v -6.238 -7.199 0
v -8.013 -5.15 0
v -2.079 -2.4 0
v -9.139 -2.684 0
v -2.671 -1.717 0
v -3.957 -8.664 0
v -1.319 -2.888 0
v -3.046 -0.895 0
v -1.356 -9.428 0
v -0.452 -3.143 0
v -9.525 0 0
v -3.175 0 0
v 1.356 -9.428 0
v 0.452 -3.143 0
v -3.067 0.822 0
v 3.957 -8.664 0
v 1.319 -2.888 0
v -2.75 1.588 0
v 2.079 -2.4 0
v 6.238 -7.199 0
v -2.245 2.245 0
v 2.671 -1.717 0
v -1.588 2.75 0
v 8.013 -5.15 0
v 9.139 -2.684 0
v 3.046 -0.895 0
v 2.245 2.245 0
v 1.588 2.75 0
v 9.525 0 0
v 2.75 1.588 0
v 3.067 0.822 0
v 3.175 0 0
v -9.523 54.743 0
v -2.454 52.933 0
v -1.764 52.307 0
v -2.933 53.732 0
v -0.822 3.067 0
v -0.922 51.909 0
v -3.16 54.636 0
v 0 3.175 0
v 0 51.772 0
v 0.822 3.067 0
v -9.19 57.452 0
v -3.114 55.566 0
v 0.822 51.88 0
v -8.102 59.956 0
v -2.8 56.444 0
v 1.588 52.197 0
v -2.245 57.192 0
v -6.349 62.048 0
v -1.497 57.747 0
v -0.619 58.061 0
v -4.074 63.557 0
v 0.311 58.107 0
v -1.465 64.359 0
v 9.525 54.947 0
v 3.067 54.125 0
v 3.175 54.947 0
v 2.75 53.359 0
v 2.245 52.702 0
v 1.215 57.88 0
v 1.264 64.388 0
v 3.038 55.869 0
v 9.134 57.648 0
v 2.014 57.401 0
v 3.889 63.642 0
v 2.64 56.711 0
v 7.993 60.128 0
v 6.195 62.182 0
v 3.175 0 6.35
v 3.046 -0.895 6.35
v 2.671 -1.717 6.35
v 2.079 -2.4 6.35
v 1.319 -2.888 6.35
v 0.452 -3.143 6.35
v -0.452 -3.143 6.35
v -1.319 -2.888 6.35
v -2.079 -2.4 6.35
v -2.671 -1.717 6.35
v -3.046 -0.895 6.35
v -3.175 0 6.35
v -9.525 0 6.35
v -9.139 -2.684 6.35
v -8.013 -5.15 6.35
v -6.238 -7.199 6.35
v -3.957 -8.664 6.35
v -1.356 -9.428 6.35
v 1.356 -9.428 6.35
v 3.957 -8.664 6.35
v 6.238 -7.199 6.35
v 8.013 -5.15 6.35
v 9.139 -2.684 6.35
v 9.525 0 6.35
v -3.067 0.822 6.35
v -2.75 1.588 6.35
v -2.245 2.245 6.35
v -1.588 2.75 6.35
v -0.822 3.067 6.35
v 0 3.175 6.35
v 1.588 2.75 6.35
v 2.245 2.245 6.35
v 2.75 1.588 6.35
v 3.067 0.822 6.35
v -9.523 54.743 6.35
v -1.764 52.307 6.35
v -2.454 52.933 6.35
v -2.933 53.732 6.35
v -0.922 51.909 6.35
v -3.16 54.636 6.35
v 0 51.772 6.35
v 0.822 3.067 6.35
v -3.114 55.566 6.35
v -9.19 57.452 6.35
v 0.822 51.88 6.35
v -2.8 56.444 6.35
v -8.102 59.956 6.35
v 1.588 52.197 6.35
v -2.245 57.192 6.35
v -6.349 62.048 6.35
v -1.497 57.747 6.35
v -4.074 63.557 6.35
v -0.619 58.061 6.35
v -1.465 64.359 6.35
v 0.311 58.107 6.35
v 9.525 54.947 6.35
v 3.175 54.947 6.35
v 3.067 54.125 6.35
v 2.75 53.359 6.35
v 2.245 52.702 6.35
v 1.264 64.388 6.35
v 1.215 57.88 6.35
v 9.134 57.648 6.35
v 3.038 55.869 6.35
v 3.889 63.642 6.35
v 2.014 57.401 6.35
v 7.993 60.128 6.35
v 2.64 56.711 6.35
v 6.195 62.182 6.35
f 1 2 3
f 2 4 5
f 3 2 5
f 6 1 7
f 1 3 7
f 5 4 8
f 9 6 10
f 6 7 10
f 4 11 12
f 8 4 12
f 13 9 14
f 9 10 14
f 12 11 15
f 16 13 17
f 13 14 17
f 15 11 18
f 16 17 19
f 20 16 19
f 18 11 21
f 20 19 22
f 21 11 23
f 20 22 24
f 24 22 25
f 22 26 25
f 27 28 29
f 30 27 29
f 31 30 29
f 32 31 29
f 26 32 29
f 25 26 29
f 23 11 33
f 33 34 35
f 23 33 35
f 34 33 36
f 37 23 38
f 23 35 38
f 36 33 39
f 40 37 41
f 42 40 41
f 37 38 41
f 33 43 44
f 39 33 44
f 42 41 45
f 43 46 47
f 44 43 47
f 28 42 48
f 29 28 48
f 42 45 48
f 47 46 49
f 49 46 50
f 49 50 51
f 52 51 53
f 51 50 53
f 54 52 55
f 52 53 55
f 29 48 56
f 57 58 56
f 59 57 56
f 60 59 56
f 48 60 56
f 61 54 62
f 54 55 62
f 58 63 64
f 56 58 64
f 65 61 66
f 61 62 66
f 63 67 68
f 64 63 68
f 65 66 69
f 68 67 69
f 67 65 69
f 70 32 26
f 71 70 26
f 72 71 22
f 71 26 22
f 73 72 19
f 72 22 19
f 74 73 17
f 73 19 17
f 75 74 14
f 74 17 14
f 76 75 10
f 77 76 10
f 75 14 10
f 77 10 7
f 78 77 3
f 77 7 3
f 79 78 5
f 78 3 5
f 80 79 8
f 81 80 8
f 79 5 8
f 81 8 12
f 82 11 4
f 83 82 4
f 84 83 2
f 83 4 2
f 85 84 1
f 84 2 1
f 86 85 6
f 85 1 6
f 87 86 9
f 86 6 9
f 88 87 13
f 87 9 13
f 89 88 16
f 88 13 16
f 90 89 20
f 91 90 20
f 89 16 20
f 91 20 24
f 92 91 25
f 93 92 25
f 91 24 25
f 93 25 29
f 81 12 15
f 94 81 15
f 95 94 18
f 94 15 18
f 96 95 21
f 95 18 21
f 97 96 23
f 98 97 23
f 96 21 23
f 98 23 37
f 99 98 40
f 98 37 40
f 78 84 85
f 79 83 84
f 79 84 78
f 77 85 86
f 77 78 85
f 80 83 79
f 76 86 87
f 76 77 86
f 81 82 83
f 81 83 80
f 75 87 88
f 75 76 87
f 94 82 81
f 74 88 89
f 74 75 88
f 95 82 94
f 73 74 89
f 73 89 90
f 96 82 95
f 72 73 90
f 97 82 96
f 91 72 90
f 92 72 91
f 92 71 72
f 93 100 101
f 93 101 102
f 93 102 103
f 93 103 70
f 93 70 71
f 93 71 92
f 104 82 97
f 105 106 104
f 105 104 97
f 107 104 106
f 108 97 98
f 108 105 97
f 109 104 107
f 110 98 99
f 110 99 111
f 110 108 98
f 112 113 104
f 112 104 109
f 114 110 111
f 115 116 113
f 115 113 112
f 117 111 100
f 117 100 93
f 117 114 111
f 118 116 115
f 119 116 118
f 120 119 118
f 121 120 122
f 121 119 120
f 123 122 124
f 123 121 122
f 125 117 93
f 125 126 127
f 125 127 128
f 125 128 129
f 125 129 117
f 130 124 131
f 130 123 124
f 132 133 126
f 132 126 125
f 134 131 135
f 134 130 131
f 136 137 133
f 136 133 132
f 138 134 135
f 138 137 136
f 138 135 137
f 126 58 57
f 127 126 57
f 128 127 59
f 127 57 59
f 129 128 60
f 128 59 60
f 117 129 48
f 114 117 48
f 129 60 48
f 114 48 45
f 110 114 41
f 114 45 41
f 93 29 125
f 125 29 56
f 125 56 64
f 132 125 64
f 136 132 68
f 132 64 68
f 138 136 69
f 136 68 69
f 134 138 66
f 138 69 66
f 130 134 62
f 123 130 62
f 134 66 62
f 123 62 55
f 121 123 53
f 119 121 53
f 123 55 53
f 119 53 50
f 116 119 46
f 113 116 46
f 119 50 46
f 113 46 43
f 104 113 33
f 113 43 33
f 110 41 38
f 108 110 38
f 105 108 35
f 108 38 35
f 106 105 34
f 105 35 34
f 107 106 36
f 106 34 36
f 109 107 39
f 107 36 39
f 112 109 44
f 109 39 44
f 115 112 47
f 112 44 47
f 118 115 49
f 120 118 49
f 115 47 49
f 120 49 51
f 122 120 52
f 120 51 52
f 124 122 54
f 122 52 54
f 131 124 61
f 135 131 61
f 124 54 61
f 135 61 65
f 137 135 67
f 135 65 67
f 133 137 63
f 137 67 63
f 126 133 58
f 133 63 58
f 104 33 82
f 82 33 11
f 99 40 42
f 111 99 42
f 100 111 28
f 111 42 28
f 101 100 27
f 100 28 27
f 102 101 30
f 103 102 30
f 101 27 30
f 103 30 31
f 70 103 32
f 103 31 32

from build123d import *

# Parameters (mm, degrees)
F1_DEPTH = 6.35


with BuildPart() as f1:
    # F0 (on Top) → F1 (new body)
    with BuildSketch(Plane.XY):
        with BuildLine():
            ThreePointArc((-3.175, 0), (-2.2450640303, 2.2450640303), (0, 3.175))
            Line((0, 3.175), (0, 9.525))
            ThreePointArc((0, 9.525), (-6.7351920908, 6.7351920908), (-9.525, 0))
            Line((-9.5250000075, 0), (-3.175, 0))
        make_face()
        with BuildLine():
            Line((0, 9.525), (0, 3.175))
            ThreePointArc((0, 3.175), (2.2450640303, 2.2450640303), (3.175, 0))
            Line((3.175, 0), (9.525, 0))
            ThreePointArc((9.525, 0), (6.7351920908, 6.7351920908), (0, 9.525))
        make_face()
        with BuildLine():
            Line((9.525, 0), (3.175, 0))
            ThreePointArc((3.175, 0), (0, -3.175), (-3.175, 0))
            Line((-3.175, 0), (-9.5250000075, 0))
            ThreePointArc((-9.525, 0), (0, -9.525), (9.525, 0))
        make_face()
        with BuildLine():
            ThreePointArc((-9.525, 0), (-6.7351920908, 6.7351920908), (0, 9.525))
            Line((0, 9.525), (0, 45.4219387724))
            ThreePointArc((0, 45.4219387724), (-6.6627997611, 48.1401242205), (-9.5228225449, 54.7432827422))
            Line((-9.5228225449, 54.7432827422), (-9.5250000075, 0))
        make_face()
        with BuildLine():
            Line((0, 45.4219387724), (0, 9.525))
            ThreePointArc((0, 9.525), (6.7351920908, 6.7351920908), (9.525, 0))
            Line((9.525, 0), (9.525, 54.9469387724))
            ThreePointArc((9.525, 54.9469387724), (6.7351920908, 48.2117466816), (0, 45.4219387724))
        make_face()
        with BuildLine():
            ThreePointArc((-9.5228225449, 54.7432827422), (-6.6627997611, 48.1401242205), (0, 45.4219387724))
            ThreePointArc((0, 45.4219387724), (6.7351920908, 48.2117466816), (9.525, 54.9469387724))
            ThreePointArc((9.525, 54.9469387724), (-0.1018338352, 64.4713943931), (-9.5228225449, 54.7432827422))
        make_face()
        with BuildLine():
            ThreePointArc((3.175, 54.9469387724), (2.2450640303, 52.7018747421), (0, 51.7719387724))
            ThreePointArc((0, 51.7719387724), (-2.2450640303, 57.1920028027), (3.175, 54.9469387724))
        make_face(mode=Mode.SUBTRACT)
    extrude(amount=F1_DEPTH)


solid = f1.part
